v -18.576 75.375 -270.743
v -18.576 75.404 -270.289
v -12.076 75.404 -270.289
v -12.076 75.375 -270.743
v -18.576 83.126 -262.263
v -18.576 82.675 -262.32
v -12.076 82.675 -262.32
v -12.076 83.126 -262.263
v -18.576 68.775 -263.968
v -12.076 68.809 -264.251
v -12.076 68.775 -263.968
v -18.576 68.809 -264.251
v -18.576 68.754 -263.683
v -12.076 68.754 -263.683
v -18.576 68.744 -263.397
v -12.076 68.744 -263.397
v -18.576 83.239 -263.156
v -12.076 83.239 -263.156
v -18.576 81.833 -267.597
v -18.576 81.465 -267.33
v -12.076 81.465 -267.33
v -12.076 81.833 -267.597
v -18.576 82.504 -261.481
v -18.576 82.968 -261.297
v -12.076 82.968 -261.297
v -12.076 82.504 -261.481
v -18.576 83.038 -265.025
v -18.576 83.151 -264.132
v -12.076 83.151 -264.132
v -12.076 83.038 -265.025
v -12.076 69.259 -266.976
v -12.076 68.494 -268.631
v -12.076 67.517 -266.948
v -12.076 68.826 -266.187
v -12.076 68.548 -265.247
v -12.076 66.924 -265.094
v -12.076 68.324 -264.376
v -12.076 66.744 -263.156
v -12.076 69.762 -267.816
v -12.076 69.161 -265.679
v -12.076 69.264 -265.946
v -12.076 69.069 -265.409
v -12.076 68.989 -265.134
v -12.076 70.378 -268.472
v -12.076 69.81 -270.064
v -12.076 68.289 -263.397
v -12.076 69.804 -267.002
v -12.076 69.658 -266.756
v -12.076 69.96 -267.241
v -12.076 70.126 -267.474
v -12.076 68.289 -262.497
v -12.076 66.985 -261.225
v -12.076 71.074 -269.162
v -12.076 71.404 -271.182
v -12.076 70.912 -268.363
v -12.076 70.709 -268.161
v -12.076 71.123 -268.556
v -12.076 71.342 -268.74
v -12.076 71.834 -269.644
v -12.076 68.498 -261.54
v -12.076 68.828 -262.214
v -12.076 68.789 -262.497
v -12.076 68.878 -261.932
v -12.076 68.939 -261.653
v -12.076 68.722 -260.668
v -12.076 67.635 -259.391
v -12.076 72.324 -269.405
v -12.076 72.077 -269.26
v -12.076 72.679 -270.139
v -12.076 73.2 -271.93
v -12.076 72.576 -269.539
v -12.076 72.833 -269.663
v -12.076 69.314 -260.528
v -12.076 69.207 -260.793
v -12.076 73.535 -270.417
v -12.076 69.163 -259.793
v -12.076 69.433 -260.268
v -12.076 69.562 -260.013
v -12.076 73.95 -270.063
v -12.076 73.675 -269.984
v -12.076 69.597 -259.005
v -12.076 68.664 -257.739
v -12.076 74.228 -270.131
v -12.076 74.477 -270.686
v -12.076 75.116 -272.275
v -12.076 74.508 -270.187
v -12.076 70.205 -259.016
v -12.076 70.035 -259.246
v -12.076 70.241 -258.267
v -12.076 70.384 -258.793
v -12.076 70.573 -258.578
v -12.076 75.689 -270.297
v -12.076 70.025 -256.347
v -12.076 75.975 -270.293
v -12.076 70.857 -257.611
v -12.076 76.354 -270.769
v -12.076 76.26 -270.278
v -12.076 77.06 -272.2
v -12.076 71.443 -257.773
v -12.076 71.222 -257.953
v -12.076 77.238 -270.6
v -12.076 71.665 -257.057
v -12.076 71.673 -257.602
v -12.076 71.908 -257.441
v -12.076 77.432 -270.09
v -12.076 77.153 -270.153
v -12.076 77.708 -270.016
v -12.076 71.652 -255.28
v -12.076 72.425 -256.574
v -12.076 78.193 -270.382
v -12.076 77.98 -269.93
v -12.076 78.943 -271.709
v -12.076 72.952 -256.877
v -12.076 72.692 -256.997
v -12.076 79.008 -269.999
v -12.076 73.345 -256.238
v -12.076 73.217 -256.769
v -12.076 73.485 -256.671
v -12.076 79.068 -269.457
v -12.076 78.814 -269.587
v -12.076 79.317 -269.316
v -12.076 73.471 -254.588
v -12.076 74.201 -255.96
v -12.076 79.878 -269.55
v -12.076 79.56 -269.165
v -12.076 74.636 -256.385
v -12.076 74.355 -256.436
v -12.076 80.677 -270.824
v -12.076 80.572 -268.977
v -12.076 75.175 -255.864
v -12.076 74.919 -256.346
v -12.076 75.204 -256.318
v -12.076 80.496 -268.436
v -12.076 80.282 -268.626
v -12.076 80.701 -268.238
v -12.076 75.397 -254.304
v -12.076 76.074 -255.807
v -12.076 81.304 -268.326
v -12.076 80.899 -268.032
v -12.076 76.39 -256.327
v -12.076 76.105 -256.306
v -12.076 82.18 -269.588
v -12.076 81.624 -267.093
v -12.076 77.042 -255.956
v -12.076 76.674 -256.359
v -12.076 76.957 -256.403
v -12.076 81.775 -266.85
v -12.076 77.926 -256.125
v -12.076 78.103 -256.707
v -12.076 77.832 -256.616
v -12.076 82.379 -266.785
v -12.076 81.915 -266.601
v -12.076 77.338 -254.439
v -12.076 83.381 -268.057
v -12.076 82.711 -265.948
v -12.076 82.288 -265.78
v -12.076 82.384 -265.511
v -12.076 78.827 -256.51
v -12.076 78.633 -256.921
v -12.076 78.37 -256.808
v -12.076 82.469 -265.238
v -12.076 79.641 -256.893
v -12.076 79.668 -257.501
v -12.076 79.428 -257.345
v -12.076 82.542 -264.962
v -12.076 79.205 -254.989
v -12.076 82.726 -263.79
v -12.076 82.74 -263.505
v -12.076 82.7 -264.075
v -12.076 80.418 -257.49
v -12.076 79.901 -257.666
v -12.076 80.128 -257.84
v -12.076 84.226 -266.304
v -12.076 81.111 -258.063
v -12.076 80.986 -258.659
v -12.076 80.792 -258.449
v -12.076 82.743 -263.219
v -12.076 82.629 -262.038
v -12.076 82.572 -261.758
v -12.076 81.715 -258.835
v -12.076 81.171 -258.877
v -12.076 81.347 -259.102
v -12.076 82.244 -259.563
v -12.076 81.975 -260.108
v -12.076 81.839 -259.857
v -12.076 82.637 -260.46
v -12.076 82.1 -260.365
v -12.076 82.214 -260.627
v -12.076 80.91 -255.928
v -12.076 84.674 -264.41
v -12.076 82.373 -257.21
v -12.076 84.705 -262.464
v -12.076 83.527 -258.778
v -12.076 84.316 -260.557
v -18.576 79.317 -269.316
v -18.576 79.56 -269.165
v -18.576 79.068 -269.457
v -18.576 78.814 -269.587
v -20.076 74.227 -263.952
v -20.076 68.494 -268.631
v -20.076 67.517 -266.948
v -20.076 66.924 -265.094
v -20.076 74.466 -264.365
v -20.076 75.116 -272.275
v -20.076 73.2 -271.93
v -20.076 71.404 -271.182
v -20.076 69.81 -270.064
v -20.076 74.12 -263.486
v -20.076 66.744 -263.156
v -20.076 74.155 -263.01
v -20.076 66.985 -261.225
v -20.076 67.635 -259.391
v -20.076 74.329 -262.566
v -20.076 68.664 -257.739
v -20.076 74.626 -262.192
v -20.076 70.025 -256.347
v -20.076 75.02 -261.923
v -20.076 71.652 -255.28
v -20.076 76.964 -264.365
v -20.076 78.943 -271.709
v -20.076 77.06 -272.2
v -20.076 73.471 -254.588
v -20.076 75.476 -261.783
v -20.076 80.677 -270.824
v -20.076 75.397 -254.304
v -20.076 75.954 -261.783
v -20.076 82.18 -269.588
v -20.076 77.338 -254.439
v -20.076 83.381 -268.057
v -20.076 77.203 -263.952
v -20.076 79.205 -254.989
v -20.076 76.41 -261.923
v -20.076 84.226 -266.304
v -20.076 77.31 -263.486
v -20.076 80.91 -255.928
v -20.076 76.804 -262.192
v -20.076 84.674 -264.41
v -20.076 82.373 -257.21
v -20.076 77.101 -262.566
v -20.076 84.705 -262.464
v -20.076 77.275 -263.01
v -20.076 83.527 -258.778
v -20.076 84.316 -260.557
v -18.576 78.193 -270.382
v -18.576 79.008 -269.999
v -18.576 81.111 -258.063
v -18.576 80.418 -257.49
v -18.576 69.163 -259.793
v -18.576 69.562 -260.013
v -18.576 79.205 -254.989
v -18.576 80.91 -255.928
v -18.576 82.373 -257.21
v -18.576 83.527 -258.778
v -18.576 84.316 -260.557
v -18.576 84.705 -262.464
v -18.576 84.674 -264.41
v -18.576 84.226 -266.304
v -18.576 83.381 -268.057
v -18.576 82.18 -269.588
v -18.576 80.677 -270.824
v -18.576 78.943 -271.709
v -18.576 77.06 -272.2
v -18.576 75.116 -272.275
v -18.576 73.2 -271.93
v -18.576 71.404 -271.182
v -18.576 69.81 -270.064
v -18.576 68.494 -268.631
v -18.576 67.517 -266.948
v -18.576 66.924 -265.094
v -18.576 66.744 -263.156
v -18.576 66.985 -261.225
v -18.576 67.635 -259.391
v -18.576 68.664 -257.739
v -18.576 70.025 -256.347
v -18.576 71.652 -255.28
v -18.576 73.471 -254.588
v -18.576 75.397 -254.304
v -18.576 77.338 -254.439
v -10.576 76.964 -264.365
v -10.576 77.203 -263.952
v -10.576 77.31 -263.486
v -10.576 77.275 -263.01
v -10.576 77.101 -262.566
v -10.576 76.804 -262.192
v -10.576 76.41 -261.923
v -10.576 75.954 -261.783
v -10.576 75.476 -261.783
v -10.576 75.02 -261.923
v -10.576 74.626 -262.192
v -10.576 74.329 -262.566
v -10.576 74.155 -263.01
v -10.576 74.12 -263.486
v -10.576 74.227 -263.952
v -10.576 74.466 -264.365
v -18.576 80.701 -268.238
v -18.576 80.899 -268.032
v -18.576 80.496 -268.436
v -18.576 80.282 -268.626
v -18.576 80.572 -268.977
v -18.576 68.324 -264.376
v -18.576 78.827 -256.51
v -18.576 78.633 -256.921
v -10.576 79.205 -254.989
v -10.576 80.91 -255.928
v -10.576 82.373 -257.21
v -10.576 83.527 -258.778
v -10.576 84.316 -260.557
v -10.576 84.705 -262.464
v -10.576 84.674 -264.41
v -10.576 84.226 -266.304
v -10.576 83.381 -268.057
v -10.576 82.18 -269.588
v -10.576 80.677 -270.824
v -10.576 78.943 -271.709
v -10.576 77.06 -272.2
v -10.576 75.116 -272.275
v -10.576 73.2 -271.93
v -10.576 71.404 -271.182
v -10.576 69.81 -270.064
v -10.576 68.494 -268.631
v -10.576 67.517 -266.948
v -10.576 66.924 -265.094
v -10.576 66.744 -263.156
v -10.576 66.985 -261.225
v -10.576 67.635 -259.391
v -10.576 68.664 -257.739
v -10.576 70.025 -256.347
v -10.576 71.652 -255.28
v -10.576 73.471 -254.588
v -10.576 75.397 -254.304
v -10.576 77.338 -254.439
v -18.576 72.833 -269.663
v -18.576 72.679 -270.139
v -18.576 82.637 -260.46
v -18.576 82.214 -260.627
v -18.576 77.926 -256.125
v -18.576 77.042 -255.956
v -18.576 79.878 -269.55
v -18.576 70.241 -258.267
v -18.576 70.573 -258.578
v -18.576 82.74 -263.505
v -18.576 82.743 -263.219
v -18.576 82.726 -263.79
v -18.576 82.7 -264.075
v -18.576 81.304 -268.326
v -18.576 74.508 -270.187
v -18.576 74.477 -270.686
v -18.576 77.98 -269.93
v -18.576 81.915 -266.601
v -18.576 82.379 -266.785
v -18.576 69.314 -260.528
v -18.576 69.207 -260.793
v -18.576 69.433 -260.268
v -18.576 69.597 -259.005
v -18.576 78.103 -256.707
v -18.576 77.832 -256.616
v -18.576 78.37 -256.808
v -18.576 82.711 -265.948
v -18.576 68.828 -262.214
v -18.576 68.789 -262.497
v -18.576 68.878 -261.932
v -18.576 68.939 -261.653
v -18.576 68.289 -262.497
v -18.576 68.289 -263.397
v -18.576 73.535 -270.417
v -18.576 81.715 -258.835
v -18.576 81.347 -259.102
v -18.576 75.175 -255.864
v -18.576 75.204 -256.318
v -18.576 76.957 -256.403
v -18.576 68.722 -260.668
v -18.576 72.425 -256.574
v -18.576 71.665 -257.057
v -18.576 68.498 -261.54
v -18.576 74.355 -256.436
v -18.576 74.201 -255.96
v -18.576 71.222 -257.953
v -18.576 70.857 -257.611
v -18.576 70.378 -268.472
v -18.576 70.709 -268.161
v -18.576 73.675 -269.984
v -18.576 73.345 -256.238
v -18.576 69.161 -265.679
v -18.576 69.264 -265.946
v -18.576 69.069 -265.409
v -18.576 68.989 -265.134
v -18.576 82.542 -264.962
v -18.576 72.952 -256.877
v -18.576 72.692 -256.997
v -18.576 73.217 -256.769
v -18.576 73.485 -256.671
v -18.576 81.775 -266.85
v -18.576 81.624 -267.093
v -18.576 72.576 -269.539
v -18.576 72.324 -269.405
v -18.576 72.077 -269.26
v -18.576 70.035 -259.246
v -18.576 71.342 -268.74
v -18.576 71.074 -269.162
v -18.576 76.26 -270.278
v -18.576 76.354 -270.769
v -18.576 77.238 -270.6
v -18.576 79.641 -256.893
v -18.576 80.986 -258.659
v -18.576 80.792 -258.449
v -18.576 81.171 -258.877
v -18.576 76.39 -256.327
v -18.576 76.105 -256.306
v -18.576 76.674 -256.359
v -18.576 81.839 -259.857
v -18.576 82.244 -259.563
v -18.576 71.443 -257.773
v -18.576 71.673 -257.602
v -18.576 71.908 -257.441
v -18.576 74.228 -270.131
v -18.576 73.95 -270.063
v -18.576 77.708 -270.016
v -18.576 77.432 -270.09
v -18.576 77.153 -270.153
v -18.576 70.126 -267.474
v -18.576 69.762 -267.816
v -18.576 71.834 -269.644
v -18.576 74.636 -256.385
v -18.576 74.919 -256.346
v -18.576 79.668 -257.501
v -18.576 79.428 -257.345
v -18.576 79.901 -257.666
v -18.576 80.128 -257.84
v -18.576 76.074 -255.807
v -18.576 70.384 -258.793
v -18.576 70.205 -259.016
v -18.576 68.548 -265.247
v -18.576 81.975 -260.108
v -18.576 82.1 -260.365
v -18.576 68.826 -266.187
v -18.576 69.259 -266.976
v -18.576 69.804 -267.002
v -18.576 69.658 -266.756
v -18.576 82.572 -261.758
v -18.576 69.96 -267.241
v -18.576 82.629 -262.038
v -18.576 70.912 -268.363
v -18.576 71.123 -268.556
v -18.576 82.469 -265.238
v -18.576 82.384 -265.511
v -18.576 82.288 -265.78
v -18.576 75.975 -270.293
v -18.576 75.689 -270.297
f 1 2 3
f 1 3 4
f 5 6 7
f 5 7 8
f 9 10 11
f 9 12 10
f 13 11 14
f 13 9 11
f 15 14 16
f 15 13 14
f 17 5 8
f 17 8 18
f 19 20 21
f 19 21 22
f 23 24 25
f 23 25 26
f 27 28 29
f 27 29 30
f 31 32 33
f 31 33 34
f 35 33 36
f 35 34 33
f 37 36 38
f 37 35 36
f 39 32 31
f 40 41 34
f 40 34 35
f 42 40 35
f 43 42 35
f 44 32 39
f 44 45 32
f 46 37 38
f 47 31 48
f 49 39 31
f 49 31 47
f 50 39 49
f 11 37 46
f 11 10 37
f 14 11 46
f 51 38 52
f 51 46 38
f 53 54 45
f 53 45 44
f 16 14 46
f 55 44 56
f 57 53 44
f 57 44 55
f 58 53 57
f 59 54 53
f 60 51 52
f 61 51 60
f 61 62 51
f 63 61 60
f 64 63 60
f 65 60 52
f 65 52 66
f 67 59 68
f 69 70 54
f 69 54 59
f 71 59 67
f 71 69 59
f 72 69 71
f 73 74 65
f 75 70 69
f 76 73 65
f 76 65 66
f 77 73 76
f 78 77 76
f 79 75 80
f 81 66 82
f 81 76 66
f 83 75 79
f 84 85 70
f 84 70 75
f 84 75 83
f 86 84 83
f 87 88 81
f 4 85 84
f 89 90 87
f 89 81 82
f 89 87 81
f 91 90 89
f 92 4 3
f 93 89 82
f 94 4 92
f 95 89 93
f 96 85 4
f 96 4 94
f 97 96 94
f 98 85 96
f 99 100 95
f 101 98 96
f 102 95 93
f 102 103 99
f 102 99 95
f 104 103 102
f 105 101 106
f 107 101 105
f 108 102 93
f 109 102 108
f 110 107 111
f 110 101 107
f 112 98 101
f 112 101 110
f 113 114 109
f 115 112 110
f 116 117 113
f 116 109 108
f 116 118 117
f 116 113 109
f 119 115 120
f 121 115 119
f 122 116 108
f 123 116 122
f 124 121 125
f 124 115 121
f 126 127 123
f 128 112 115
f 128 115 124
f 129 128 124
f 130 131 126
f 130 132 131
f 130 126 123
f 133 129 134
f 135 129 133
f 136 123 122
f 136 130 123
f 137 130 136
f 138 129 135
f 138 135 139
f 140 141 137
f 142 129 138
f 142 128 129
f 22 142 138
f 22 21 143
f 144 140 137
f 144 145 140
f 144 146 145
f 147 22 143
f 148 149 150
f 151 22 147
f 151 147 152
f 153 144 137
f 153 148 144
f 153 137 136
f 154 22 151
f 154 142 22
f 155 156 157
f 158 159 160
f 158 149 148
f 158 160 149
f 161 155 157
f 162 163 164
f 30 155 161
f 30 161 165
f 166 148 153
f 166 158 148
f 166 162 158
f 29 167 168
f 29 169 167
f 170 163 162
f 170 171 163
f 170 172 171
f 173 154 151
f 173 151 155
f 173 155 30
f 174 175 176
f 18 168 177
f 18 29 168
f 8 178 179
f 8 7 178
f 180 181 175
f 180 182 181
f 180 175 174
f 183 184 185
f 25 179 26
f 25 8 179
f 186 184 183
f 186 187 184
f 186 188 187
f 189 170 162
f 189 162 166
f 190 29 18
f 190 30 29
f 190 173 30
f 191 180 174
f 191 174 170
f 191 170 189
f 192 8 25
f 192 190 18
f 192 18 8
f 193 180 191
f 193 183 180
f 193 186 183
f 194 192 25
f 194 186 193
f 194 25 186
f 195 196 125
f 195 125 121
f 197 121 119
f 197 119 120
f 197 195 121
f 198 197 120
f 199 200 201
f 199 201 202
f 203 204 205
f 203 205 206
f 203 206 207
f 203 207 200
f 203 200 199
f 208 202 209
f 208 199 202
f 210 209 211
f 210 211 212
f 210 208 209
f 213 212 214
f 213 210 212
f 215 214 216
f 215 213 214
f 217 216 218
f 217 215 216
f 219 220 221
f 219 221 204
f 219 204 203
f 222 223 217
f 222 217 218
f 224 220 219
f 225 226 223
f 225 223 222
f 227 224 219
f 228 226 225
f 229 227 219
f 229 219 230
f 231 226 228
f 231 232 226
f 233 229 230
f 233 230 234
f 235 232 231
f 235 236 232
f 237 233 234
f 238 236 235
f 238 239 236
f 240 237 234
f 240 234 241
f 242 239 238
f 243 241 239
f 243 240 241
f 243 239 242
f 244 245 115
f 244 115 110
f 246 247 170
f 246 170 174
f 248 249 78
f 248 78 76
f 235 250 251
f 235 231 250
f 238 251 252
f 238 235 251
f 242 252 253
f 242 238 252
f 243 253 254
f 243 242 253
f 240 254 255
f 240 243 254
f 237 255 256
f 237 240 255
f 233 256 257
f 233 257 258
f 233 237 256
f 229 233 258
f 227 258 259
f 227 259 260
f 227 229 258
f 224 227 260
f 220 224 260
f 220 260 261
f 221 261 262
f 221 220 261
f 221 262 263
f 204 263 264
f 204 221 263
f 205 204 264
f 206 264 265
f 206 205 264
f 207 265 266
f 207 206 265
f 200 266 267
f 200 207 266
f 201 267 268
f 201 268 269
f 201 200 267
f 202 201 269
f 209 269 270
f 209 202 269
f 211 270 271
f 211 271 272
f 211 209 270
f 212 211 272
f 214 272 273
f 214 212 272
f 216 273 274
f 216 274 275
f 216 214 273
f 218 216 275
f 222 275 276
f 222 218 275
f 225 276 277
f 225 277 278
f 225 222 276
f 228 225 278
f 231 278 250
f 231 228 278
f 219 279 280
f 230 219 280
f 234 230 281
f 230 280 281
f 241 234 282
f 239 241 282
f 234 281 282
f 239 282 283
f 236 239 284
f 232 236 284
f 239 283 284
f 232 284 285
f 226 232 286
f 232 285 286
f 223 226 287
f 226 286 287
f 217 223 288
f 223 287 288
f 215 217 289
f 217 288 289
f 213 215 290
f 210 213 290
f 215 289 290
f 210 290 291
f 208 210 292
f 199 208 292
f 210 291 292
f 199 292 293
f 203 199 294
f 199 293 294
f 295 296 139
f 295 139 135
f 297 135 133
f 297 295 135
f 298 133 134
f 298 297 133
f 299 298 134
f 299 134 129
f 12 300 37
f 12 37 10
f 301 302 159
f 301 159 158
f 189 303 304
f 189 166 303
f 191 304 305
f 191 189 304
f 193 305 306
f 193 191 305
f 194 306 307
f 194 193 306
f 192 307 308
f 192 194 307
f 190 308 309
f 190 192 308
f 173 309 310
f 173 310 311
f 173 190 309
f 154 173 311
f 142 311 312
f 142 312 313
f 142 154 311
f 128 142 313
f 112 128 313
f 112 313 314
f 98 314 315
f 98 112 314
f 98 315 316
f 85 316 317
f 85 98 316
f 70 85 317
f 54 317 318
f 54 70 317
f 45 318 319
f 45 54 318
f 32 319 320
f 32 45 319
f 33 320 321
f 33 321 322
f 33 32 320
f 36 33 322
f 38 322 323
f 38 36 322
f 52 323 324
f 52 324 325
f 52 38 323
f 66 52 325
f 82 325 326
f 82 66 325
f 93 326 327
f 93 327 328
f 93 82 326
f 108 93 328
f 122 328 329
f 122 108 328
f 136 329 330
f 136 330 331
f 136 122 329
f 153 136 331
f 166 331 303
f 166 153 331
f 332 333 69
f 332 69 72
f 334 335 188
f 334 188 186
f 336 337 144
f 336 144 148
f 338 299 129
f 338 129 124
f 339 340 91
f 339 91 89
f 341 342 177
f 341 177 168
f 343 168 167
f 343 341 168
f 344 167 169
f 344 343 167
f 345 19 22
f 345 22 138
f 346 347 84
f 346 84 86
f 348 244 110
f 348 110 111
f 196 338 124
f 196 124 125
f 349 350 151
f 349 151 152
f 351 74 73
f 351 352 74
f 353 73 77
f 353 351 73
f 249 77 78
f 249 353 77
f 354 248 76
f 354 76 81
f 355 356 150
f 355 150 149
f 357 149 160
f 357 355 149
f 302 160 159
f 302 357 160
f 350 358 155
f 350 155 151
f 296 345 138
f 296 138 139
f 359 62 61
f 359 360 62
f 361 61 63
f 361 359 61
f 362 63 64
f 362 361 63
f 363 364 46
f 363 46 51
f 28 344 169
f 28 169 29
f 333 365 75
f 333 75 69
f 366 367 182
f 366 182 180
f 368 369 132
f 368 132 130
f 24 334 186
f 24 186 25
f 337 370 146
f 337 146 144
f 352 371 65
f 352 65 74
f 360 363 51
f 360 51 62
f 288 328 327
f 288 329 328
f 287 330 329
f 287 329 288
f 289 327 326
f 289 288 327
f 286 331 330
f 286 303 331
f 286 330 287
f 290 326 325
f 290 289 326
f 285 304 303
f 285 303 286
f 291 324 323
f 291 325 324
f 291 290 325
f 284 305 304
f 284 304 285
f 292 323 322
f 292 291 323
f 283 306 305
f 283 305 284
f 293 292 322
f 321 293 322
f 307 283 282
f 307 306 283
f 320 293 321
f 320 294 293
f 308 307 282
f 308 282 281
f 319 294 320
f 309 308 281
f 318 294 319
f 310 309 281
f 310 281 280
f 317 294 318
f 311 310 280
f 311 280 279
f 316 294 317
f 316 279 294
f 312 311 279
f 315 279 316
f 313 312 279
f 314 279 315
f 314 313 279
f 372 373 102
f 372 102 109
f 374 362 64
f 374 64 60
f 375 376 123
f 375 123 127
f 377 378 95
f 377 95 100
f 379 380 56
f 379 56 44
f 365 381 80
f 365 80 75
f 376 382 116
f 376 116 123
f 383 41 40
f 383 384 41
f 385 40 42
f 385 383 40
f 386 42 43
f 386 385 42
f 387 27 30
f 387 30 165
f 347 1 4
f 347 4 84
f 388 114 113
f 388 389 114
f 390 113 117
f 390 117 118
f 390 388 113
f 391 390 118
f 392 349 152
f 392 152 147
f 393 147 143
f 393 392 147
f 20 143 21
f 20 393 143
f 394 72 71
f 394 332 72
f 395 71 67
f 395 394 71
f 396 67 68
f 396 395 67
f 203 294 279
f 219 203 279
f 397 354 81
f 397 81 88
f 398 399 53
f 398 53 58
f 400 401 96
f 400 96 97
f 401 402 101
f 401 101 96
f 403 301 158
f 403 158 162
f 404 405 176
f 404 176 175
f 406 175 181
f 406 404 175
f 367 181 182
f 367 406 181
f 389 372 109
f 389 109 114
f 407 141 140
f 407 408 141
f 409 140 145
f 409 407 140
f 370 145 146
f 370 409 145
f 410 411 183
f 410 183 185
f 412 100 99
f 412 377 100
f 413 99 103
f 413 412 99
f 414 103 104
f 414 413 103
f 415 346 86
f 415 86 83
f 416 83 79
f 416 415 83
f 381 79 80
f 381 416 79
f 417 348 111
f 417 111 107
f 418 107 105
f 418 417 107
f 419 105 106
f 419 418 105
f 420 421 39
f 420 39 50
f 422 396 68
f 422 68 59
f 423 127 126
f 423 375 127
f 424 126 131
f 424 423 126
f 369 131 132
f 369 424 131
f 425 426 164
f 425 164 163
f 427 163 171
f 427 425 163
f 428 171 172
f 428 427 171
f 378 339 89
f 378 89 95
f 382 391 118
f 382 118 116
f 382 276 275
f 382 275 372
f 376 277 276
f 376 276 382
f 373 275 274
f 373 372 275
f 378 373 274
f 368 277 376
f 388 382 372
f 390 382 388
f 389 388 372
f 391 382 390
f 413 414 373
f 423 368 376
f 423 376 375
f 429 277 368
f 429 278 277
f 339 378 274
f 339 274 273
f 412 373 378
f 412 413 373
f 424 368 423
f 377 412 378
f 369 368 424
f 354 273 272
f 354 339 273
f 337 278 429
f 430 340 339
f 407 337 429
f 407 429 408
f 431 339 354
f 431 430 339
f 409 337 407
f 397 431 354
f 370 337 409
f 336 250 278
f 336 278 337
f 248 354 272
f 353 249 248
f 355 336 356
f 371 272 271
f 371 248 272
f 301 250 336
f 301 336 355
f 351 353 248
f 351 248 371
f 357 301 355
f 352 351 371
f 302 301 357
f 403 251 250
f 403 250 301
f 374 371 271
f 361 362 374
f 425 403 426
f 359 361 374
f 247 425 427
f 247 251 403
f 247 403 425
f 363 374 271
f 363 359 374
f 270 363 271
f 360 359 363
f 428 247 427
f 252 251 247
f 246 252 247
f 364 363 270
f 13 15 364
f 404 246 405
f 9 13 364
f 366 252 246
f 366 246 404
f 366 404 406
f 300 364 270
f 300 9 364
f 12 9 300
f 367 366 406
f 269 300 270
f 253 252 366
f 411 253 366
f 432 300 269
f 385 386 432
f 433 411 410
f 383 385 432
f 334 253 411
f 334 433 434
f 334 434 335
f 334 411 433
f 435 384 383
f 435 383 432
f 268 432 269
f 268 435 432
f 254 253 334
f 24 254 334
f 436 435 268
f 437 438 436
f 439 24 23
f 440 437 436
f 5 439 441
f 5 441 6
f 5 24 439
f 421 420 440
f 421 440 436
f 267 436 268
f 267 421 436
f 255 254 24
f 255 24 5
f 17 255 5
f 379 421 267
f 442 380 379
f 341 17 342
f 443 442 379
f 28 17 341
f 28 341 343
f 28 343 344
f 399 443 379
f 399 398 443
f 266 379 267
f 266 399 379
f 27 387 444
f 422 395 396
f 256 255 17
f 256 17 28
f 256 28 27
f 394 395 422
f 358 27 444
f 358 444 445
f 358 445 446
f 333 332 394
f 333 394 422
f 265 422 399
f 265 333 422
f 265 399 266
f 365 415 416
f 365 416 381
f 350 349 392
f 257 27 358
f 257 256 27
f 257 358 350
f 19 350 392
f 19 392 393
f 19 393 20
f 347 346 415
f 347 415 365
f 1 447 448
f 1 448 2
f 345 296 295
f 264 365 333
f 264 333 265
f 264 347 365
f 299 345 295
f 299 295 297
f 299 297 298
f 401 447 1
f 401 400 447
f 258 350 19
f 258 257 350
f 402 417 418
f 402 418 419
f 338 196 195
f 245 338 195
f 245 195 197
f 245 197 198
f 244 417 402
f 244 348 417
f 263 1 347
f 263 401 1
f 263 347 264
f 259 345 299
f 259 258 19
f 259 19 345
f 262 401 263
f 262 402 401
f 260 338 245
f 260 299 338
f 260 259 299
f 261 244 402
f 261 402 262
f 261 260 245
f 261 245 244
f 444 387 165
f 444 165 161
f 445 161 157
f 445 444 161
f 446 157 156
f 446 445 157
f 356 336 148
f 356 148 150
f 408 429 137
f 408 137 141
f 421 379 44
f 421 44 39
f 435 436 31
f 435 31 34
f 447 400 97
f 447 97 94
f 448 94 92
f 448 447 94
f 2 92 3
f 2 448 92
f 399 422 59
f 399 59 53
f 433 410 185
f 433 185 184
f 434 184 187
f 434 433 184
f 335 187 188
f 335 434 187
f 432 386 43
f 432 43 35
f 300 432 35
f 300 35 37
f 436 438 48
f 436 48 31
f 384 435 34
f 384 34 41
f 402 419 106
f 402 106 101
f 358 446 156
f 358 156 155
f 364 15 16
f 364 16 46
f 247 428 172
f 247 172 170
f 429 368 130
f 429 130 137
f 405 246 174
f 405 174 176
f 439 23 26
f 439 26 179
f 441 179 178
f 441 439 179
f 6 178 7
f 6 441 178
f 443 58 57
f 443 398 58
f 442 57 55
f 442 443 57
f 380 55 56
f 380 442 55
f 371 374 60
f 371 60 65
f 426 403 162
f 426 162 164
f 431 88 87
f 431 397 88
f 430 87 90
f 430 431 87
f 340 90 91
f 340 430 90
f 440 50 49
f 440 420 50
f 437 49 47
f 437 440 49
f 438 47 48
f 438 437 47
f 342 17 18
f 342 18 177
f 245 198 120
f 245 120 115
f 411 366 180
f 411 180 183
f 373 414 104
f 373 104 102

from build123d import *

# Parameters (mm, degrees)
BOSS_EXTRUDE1_DEPTH = 6.5
CUT_EXTRUDE1_DEPTH  = 9.5


with BuildPart() as part:
    # Sketch1 → Revolve1 (revolve)
    with BuildSketch(Plane(origin=(0, 158.016793392, -65.84033058), x_dir=(1, 0, 0), z_dir=(0, 0.923076923, -0.384615385))):
        Polygon((-20.075714319, 213.91124457), (-10.575714319, 213.91124457), (-10.575714319, 204.91124457), (-12.075714319, 204.91124457), (-12.075714319, 206.91124457), (-18.575714319, 206.91124457), (-18.575714319, 204.91124457), (-20.075714319, 204.91124457), align=None)
    revolve(axis=Axis((-11.075714319, 75.743237788, -263.296864029), (-1, 0, 0)))

    # Sketch2 → Boss-Extrude1 (add)
    with BuildSketch(Plane(origin=(-18.575714319, 0, 0), x_dir=(0, 0, -1), z_dir=(1, 0, 0))):
        with BuildLine():
            Line((263.396864029, 68.74395211), (263.396864029, 68.289102327))
            Line((263.396864029, 68.289102327), (262.496864029, 68.289102327))
            Line((262.496864029, 68.289102327), (262.496864029, 68.789102327))
            ThreePointArc((262.496864029, 68.789102327), (262.946136734, 68.752029711), (263.396864029, 68.74395211))
        make_face()
        with BuildLine():
            Line((261.65307078, 68.938978551), (261.539954239, 68.498418711))
            Line((261.539954239, 68.498418711), (260.668229394, 68.72223961))
            Line((260.668229394, 68.72223961), (260.792574337, 69.20653119))
            ThreePointArc((260.792574337, 69.20653119), (261.218512729, 69.058893701), (261.65307078, 68.938978551))
        make_face()
        with BuildLine():
            Line((260.012563106, 69.561541625), (259.793437552, 69.162953722))
            Line((259.793437552, 69.162953722), (259.00476154, 69.596532029))
            Line((259.00476154, 69.596532029), (259.245638377, 70.034685369))
            ThreePointArc((259.245638377, 70.034685369), (259.621479181, 69.785759612), (260.012563106, 69.561541625))
        make_face()
        with BuildLine():
            Line((258.578420138, 70.572523404), (258.267054035, 70.240952182))
            Line((258.267054035, 70.240952182), (257.610982271, 70.857044577))
            Line((257.610982271, 70.857044577), (257.953255824, 71.221528891))
            ThreePointArc((257.953255824, 71.221528891), (258.255383579, 70.886955787), (258.578420138, 70.572523404))
        make_face()
        with BuildLine():
            Line((257.440754352, 71.908400183), (257.056711979, 71.664679482))
            Line((257.056711979, 71.664679482), (256.574467864, 72.424574615))
            Line((256.574467864, 72.424574615), (256.996631826, 72.692488013))
            ThreePointArc((256.996631826, 72.692488013), (257.206062735, 72.293290021), (257.440754352, 71.908400183))
        make_face()
        with BuildLine():
            Line((256.671049475, 73.485233913), (256.238461626, 73.3446776))
            Line((256.238461626, 73.3446776), (255.960346331, 74.200628465))
            Line((255.960346331, 74.200628465), (256.435874589, 74.355136962))
            ThreePointArc((256.435874589, 74.355136962), (256.539449337, 73.91639716), (256.671049475, 73.485233913))
        make_face()
        with BuildLine():
            Line((256.317668895, 75.203946331), (255.863716654, 75.175386077))
            Line((255.863716654, 75.175386077), (255.807205187, 76.073610132))
            Line((255.807205187, 76.073610132), (256.306218551, 76.105005392))
            ThreePointArc((256.306218551, 76.105005392), (256.297429156, 75.654291415), (256.317668895, 75.203946331))
        make_face()
        with BuildLine():
            Line((256.402816812, 76.956544414), (255.95602367, 77.041774764))
            Line((255.95602367, 77.041774764), (256.124666853, 77.92583329))
            Line((256.124666853, 77.92583329), (256.615810478, 77.832142633))
            ThreePointArc((256.615810478, 77.832142633), (256.49520921, 77.397774498), (256.402816812, 76.956544414))
        make_face()
        with BuildLine():
            Line((256.921143071, 78.63290598), (256.509582683, 78.826571598))
            Line((256.509582683, 78.826571598), (256.892784045, 79.640915945))
            Line((256.892784045, 79.640915945), (257.345197571, 79.428026299))
            ThreePointArc((257.345197571, 79.428026299), (257.120362252, 79.037296954), (256.921143071, 78.63290598))
        make_face()
        with BuildLine():
            Line((257.840079325, 80.127699066), (257.489611545, 80.417631229))
            Line((257.489611545, 80.417631229), (258.063293135, 81.111093147))
            Line((258.063293135, 81.111093147), (258.448549757, 80.792381152))
            ThreePointArc((258.448549757, 80.792381152), (258.133607615, 80.469841558), (257.840079325, 80.127699066))
        make_face()
        with BuildLine():
            Line((259.101885432, 81.347000324), (258.834531438, 81.714981528))
            Line((258.834531438, 81.714981528), (259.562646733, 82.243988255))
            Line((259.562646733, 82.243988255), (259.856539359, 81.839479758))
            ThreePointArc((259.856539359, 81.839479758), (259.471279368, 81.605396264), (259.101885432, 81.347000324))
        make_face()
        with BuildLine():
            Line((260.627277471, 82.214196574), (260.459836099, 82.637105206))
            Line((260.459836099, 82.637105206), (261.296634936, 82.968417303))
            Line((261.296634936, 82.968417303), (261.480697212, 82.50352906))
            ThreePointArc((261.480697212, 82.50352906), (261.049326675, 82.372609993), (260.627277471, 82.214196574))
        make_face()
        with BuildLine():
            Line((262.320409452, 82.674798684), (262.263401658, 83.12606184))
            Line((262.263401658, 83.12606184), (263.15630489, 83.23886175))
            Line((263.15630489, 83.23886175), (263.218971506, 82.7428044))
            ThreePointArc((263.218971506, 82.7428044), (262.76859502, 82.723275886), (262.320409452, 82.674798684))
        make_face()
        with BuildLine():
            Line((264.074895666, 82.699865331), (264.13190346, 83.151128487))
            Line((264.13190346, 83.151128487), (265.024806691, 83.038328577))
            Line((265.024806691, 83.038328577), (264.962140074, 82.542271226))
            ThreePointArc((264.962140074, 82.542271226), (264.52105645, 82.635360314), (264.074895666, 82.699865331))
        make_face()
        with BuildLine():
            Line((265.78049529, 82.287821484), (265.947936663, 82.710730117))
            Line((265.947936663, 82.710730117), (266.7847355, 82.379418019))
            Line((266.7847355, 82.379418019), (266.600673224, 81.914529776))
            ThreePointArc((266.600673224, 81.914529776), (266.196597367, 82.114387336), (265.78049529, 82.287821484))
        make_face()
        with BuildLine():
            Line((267.330039228, 81.464557375), (267.597393222, 81.832538579))
            Line((267.597393222, 81.832538579), (268.325508517, 81.303531852))
            Line((268.325508517, 81.303531852), (268.031615891, 80.899023354))
            ThreePointArc((268.031615891, 80.899023354), (267.689937374, 81.193091601), (267.330039228, 81.464557375))
        make_face()
        with BuildLine():
            Line((268.626163935, 80.281801714), (268.976631716, 80.571733877))
            Line((268.976631716, 80.571733877), (269.550313307, 79.878271959))
            Line((269.550313307, 79.878271959), (269.165056685, 79.559559964))
            ThreePointArc((269.165056685, 79.559559964), (268.907244427, 79.929361507), (268.626163935, 80.281801714))
        make_face()
        with BuildLine():
            Line((269.587429129, 78.81387139), (269.998989517, 79.007537008))
            Line((269.998989517, 79.007537008), (270.38219088, 78.193192661))
            Line((270.38219088, 78.193192661), (269.929777353, 77.980303015))
            ThreePointArc((269.929777353, 77.980303015), (269.772030645, 78.402601865), (269.587429129, 78.81387139))
        make_face()
        with BuildLine():
            Line((270.153434983, 77.153001864), (270.600228126, 77.238232214))
            Line((270.600228126, 77.238232214), (270.768871309, 76.354173689))
            Line((270.768871309, 76.354173689), (270.277727683, 76.260483031))
            ThreePointArc((270.277727683, 76.260483031), (270.229958331, 76.708744597), (270.153434983, 77.153001864))
        make_face()
        with BuildLine():
            Line((270.288617268, 75.403551676), (270.742569508, 75.374991422))
            Line((270.742569508, 75.374991422), (270.68605804, 74.476767367))
            Line((270.68605804, 74.476767367), (270.187044676, 74.508162626))
            ThreePointArc((270.187044676, 74.508162626), (270.252254204, 74.954220986), (270.288617268, 75.403551676))
        make_face()
        with BuildLine():
            Line((269.984481982, 73.675445216), (270.417069832, 73.534888904))
            Line((270.417069832, 73.534888904), (270.138954537, 72.678938039))
            Line((270.138954537, 72.678938039), (269.663426278, 72.833446536))
            ThreePointArc((269.663426278, 72.833446536), (269.837517332, 73.249274201), (269.984481982, 73.675445216))
        make_face()
        with BuildLine():
            Line((269.260139065, 72.077265768), (269.644181438, 71.833545067))
            Line((269.644181438, 71.833545067), (269.161937323, 71.073649934))
            Line((269.161937323, 71.073649934), (268.73977336, 71.341563332))
            ThreePointArc((268.73977336, 71.341563332), (269.011807158, 71.701032322), (269.260139065, 72.077265768))
        make_face()
        with BuildLine():
            Line((268.161101646, 70.709432825), (268.472467748, 70.377861603))
            Line((268.472467748, 70.377861603), (267.816395984, 69.761769208))
            Line((267.816395984, 69.761769208), (267.474122431, 70.126253522))
            ThreePointArc((267.474122431, 70.126253522), (267.82700609, 70.406777078), (268.161101646, 70.709432825))
        make_face()
        with BuildLine():
            Line((266.756426289, 69.65789236), (266.975551842, 69.259304457))
            Line((266.975551842, 69.259304457), (266.18687583, 68.825726151))
            Line((266.18687583, 68.825726151), (265.945998993, 69.263879491))
            ThreePointArc((265.945998993, 69.263879491), (266.357559535, 69.447831286), (266.756426289, 69.65789236))
        make_face()
        with BuildLine():
            Line((265.134373911, 68.988716529), (265.247490452, 68.548156689))
            Line((265.247490452, 68.548156689), (264.375765607, 68.32433579))
            Line((264.375765607, 68.32433579), (264.251420663, 68.808627371))
            ThreePointArc((264.251420663, 68.808627371), (264.695798225, 68.884449038), (265.134373911, 68.988716529))
        make_face()
    extrude(amount=BOSS_EXTRUDE1_DEPTH)

    # Sketch3 → Cut-Extrude1 (cut)
    with BuildSketch(Plane(origin=(-10.575714319, 0, 0), x_dir=(0, 0, -1), z_dir=(1, 0, 0))):
        with BuildLine():
            Line((264.364668647, 74.465986264), (264.364668647, 76.963985463))
            ThreePointArc((264.364668647, 76.963985463), (261.764668647, 75.714985864), (264.364668647, 74.465986264))
        make_face()
    extrude(amount=-CUT_EXTRUDE1_DEPTH, mode=Mode.SUBTRACT)


solid = part.part
